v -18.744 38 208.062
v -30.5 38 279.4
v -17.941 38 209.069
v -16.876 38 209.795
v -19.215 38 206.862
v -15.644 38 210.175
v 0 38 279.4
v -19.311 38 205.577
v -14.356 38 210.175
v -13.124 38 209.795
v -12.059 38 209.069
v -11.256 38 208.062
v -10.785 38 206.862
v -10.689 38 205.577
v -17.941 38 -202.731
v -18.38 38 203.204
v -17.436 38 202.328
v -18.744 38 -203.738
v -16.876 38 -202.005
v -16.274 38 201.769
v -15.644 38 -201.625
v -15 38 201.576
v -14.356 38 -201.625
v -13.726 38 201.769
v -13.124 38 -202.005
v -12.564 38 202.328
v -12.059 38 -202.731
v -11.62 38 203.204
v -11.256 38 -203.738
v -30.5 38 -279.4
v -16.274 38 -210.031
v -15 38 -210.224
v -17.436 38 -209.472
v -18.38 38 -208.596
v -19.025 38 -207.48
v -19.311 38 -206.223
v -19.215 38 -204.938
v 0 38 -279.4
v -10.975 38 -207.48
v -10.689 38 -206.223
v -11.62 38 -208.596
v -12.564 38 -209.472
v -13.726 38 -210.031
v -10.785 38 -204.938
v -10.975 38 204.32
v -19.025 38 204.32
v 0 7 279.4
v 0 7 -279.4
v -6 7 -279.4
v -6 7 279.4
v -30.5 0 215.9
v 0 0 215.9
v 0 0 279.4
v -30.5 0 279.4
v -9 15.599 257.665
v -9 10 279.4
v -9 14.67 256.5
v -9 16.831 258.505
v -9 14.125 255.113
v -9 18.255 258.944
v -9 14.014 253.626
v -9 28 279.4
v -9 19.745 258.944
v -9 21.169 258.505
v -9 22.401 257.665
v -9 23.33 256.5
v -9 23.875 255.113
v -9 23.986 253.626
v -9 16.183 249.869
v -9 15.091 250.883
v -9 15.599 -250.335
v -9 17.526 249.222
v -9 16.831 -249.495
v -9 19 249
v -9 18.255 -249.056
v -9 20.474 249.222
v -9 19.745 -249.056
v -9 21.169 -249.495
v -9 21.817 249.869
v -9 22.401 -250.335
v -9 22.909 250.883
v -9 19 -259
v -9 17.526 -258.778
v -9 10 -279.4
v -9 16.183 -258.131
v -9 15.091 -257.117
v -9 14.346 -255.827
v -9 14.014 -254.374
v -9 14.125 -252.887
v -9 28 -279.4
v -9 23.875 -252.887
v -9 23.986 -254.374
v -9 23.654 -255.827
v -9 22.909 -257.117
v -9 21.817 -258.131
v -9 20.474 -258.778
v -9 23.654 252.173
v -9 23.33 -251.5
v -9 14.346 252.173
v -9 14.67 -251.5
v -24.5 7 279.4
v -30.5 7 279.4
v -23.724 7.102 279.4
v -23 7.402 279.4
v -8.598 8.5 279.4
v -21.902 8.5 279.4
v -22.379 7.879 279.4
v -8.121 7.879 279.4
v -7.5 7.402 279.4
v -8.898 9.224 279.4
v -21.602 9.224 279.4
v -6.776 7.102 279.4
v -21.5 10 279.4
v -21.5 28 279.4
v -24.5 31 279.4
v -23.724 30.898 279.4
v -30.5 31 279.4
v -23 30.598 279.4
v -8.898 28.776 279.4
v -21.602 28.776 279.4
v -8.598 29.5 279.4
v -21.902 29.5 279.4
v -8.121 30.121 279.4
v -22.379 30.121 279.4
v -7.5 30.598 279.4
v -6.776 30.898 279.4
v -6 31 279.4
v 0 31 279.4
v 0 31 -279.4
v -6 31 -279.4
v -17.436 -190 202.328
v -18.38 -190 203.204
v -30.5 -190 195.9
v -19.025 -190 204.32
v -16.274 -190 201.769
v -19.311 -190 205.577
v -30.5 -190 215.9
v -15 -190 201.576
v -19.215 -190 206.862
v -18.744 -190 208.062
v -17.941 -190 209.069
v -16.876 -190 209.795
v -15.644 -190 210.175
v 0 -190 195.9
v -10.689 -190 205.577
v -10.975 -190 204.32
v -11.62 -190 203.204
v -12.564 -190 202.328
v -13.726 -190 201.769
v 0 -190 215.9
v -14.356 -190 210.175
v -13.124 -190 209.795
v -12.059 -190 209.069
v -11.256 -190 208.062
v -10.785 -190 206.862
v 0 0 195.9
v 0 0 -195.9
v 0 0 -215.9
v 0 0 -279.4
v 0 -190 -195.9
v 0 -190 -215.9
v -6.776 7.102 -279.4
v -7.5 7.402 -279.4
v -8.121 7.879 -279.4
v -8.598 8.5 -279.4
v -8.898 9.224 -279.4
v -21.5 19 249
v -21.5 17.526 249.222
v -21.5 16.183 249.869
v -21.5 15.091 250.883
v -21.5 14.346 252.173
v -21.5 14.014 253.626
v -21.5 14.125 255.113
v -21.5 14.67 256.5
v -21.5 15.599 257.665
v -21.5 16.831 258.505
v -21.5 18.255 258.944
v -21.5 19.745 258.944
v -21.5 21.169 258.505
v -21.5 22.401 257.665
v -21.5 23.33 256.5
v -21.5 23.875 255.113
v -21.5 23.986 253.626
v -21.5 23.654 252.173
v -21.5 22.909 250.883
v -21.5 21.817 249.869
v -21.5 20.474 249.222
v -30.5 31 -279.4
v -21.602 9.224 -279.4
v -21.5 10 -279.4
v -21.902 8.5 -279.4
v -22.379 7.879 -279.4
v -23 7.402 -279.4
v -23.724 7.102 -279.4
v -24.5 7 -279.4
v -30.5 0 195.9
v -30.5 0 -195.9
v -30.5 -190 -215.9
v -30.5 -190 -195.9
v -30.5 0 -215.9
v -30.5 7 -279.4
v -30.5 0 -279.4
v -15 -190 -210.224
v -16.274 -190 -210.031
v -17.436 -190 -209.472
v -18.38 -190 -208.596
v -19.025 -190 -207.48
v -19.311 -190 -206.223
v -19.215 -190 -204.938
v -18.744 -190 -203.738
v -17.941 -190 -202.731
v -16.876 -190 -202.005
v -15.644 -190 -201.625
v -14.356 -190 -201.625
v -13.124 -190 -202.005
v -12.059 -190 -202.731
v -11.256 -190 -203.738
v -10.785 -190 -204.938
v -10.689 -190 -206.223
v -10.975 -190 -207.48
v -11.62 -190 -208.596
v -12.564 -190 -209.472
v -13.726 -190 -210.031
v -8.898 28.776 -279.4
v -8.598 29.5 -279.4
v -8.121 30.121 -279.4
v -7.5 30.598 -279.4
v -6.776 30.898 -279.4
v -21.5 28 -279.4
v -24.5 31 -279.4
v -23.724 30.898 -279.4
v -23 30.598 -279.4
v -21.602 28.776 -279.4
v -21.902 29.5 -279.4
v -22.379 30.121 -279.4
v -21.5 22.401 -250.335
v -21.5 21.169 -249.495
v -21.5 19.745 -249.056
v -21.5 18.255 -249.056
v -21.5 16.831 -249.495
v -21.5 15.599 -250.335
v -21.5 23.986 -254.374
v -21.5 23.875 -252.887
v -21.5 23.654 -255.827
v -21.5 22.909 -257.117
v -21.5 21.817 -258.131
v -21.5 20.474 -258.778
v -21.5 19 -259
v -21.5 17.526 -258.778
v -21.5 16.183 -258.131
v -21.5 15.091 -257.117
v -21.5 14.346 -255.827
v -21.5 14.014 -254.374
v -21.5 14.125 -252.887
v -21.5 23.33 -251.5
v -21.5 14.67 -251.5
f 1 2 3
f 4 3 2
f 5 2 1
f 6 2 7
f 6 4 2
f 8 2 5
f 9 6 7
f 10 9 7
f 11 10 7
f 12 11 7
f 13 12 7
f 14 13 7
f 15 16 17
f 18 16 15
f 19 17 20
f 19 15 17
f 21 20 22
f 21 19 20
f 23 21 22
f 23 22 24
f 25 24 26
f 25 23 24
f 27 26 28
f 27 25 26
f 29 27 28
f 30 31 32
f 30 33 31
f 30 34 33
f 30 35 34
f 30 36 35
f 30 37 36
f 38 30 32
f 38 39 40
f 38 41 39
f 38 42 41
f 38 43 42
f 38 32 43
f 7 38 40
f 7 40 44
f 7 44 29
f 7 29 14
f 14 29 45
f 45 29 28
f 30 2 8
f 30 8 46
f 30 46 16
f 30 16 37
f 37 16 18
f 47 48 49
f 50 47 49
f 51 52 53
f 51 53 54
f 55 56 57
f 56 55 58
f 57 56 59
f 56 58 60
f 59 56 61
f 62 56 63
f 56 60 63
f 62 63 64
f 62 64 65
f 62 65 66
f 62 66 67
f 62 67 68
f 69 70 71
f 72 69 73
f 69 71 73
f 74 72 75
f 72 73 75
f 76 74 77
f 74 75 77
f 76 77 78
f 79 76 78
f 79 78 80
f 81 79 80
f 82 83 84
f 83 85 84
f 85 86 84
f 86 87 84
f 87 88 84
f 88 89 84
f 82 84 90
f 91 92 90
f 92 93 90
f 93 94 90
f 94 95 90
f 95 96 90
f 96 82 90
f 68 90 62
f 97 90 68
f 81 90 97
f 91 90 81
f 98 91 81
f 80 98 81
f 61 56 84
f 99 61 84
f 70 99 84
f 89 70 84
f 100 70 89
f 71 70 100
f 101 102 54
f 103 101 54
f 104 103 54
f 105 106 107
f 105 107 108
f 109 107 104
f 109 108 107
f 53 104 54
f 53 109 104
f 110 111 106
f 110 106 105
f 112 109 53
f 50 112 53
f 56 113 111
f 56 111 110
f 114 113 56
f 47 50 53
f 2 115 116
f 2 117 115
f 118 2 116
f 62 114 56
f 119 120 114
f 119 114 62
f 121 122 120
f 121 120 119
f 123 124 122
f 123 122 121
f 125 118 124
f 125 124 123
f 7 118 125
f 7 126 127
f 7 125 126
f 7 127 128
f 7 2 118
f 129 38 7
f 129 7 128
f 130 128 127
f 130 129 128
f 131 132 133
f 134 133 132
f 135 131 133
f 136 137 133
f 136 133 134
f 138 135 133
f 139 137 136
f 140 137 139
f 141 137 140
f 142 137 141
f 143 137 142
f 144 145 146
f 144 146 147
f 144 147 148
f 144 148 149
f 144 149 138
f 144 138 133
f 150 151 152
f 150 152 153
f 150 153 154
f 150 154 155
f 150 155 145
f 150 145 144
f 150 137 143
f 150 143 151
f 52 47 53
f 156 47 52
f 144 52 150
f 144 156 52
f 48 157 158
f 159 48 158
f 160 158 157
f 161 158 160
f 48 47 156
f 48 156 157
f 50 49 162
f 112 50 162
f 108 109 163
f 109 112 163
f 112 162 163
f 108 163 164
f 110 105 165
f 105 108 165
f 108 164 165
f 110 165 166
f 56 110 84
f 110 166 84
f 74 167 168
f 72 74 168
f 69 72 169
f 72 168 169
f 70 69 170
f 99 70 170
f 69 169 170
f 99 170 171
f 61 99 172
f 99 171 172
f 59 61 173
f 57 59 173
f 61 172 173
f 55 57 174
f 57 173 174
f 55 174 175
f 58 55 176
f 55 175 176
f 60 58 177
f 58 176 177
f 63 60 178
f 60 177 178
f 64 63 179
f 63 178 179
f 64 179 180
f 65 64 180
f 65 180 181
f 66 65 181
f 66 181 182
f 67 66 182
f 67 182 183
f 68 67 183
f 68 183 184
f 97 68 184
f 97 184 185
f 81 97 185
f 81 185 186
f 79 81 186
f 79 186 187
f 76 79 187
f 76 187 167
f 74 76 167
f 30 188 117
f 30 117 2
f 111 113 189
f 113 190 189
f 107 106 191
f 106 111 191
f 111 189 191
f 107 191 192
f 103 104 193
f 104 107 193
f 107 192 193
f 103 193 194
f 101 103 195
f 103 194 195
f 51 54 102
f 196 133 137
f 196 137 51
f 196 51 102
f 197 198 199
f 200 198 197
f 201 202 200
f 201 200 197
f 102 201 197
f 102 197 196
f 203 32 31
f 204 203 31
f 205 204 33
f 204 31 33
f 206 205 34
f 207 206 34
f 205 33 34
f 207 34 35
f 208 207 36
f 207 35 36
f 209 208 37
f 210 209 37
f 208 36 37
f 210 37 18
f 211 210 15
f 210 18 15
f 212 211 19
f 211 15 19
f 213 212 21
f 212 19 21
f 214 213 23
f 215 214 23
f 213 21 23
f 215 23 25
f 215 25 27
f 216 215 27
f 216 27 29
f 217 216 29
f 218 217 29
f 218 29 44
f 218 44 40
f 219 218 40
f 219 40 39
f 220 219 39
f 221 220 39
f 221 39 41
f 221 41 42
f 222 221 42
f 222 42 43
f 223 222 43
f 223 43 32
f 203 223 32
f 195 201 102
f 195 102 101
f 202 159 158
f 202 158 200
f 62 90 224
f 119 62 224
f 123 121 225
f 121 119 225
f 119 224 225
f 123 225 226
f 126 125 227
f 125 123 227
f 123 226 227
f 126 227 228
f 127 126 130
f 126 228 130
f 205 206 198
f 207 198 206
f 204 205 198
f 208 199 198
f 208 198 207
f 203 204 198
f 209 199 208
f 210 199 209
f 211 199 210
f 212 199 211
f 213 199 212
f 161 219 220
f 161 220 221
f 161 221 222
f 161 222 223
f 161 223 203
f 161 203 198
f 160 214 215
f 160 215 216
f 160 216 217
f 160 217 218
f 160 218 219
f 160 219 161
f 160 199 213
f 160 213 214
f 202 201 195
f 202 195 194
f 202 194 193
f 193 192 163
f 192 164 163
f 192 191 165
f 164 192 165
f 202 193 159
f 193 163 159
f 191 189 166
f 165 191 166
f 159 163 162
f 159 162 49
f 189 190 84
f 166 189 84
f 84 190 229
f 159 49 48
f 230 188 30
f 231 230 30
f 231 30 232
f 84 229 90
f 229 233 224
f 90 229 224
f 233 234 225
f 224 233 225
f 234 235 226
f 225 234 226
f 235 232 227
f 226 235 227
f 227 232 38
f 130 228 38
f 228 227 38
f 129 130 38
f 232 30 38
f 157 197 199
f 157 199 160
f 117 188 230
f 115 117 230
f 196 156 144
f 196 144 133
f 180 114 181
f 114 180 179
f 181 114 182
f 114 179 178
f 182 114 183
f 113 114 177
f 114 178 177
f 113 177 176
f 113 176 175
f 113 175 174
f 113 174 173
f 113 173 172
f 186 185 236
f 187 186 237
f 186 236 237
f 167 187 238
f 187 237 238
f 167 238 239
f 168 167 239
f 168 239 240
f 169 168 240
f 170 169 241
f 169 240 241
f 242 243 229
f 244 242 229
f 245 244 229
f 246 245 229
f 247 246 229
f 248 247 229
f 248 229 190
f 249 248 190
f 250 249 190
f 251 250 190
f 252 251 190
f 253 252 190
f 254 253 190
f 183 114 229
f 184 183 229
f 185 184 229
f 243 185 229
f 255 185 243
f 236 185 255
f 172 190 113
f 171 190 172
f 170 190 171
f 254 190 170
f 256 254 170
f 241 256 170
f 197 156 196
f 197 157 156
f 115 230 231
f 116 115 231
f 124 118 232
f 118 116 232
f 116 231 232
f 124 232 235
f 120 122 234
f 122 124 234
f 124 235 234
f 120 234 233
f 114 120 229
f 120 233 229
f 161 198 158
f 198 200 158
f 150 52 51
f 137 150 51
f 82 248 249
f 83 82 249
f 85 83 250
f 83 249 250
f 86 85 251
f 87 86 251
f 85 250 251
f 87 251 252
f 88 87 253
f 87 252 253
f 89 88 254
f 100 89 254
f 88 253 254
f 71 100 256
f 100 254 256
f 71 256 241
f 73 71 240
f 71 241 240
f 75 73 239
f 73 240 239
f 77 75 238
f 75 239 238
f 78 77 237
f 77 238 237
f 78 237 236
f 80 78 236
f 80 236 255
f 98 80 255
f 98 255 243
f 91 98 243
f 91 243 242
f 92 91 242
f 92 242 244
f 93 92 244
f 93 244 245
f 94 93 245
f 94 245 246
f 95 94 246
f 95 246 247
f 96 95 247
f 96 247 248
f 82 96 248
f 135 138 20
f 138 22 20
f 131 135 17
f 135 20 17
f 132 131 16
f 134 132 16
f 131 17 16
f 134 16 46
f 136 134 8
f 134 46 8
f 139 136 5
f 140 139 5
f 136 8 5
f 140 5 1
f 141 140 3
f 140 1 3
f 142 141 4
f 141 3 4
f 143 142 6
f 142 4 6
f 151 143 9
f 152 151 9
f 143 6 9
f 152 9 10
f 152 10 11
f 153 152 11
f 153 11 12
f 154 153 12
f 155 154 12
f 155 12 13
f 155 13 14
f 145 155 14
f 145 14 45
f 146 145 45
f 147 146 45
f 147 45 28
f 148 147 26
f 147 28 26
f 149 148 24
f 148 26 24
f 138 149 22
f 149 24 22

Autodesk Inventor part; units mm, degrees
ref_plane "YZ Plane" through (0, 0, 0) normal (1, 0, 0) x (0, 1, 0)
ref_plane "XZ Plane" through (0, 0, 0) normal (0, 1, 0) x (-1, 0, 0)
ref_plane "XY Plane" through (0, 0, 0) normal (0, 0, 1) x (1, 0, 0)
sketch "Sketch1" plane through (0, 0, 0) normal (0, 0, 1) x (1, 0, 0)
  line L0 (0, 0) -> (-30.5, 0)
  line L1 (-30.5, 0) -> (-30.5, 38)
  line L2 (-30.5, 38) -> (0, 38)
  line L3 (0, 38) -> (0, 0)
  line L4 (0, 0) -> (0, 7)
  line L5 (0, 38) -> (0, 31)
  line L6 (0, 31) -> (-6, 31)
  line L7 (0, 7) -> (-6, 7)
  line L8 (-9, 10) -> (-9, 28)
  line L9 (-30.5, 38) -> (-30.5, 31)
  line L10 (-30.5, 31) -> (-24.5, 31)
  line L11 (-21.5, 28) -> (-21.5, 10)
  line L12 (-30.5, 0) -> (-30.5, 7)
  line L13 (-30.5, 7) -> (-24.5, 7)
  arc A0 (-6, 31) -> (-9, 28) centre (-6, 28) ccw
  arc A1 (-9, 10) -> (-6, 7) centre (-6, 10) ccw
  arc A2 (-21.5, 28) -> (-24.5, 31) centre (-24.5, 28) ccw
  arc A3 (-24.5, 7) -> (-21.5, 10) centre (-24.5, 10) ccw
  point P0 (-9, 31)
  point P1 (-21.5, 31)
  dimension "d0" = 30.5
  dimension "d1" = 38
  dimension "d2" = 7
  dimension "d3" = 7
  dimension "d4" = 9
  dimension "d6" = 7
  dimension "d7" = 9
  dimension "d8" = 7
  dimension "d9" = 3
  dimension "d11" = 3
extrude "Extrusion1" add sketch "Sketch1" along normal mid plane 558.8 contours L0 L1 L13 A3 L11 A2 L10 L2 L3 L6 A0 L8 A1 L7
hole "Hole1" at (-9, 19, 254) direction (-1, 0, 0) diameter 10 depth 25
sketch "Sketch7" plane through (-9, 10, 279.4) normal (1, 0, 0) x (0, 0, -1)
  line L0 (558.8, 18) -> (558.8, 0) projected
  line L1 (558.8, 18) -> (0, 18) projected
  point P0 (533.4, 9)
  dimension "d23" = 25.4
  dimension "d25" = 9
hole "Hole2" at (-9, 19, -254) direction (-1, 0, 0) diameter 10 depth 25 tip angle 118
sketch "Sketch2" plane through (-30.5, 0, 279.4) normal (0, -1, 0) x (1, 0, 0)
  line L0 (0, 0) -> (30.5, 0) projected
  line L1 (15.25, 0) -> (15.25, -63.5)
  line L2 (15.25, -63.5) -> (0, -63.5)
  line L3 (0, -558.8) -> (0, 0) projected
  line L4 (15.25, -63.5) -> (30.5, -63.5)
  line L5 (30.5, -63.5) -> (30.5, -83.5)
  line L6 (30.5, -558.8) -> (30.5, 0) projected
  line L7 (30.5, -83.5) -> (0, -83.5)
  line L8 (0, -83.5) -> (0, -63.5)
  line L9 (30.5, -558.8) -> (0, -558.8) projected
  line L10 (15.25, -558.8) -> (15.25, -495.3)
  line L11 (15.25, -495.3) -> (30.5, -495.3)
  line L12 (15.25, -495.3) -> (0, -495.3)
  line L13 (0, -495.3) -> (0, -475.3)
  line L14 (0, -475.3) -> (30.5, -475.3)
  line L15 (30.5, -475.3) -> (30.5, -495.3)
  point P0 (30.5, -279.4)
  dimension "d33" = 63.5
  dimension "d34" = 20
  dimension "d35" = 30.5
  dimension "d36" = 63.5
  dimension "d37" = 20
extrude "Extrusion2" add sketch "Sketch2" along normal blind 190 contours L2 L4 L5 L7 L3 | L14 L6 L11 L12 L3
sketch "Sketch5" plane through (-30.5, 38, 279.4) normal (0, 1, 0) x (1, 0, 0)
  point P0 (30.5, 279.4)
sketch "Sketch10" plane through (-30.5, -190, 279.4) normal (0, -1, 0) x (1, 0, 0)
  line L0 (30.5, -495.3) -> (30.5, -475.3) projected
  line L1 (0, -495.3) -> (30.5, -495.3) projected
  point P0 (30.5, -279.4)
  point P1 (15.5, -485.3)
  dimension "d82" = 15
  dimension "d83" = 10
hole "Hole6" at (-15, -190, -205.9) direction (0, 1, 0) diameter 8.647 end through all thread size "M10x1.25" class "6H" standard "ANSI Metric M Profile"
sketch "Sketch11" plane through (-30.5, -190, 279.4) normal (0, -1, 0) x (1, 0, 0)
  line L0 (30.5, -83.5) -> (30.5, -63.5) projected
  line L1 (0, -83.5) -> (30.5, -83.5) projected
  point P0 (30.5, -279.4)
  point P1 (15.5, -73.5)
  dimension "d91" = 15
  dimension "d92" = 10
hole "Hole7" at (-15, -190, 205.9) direction (0, 1, 0) diameter 8.647 end through all thread size "M10x1.25" class "6H" standard "ANSI Metric M Profile"
properties part number "Barra"
